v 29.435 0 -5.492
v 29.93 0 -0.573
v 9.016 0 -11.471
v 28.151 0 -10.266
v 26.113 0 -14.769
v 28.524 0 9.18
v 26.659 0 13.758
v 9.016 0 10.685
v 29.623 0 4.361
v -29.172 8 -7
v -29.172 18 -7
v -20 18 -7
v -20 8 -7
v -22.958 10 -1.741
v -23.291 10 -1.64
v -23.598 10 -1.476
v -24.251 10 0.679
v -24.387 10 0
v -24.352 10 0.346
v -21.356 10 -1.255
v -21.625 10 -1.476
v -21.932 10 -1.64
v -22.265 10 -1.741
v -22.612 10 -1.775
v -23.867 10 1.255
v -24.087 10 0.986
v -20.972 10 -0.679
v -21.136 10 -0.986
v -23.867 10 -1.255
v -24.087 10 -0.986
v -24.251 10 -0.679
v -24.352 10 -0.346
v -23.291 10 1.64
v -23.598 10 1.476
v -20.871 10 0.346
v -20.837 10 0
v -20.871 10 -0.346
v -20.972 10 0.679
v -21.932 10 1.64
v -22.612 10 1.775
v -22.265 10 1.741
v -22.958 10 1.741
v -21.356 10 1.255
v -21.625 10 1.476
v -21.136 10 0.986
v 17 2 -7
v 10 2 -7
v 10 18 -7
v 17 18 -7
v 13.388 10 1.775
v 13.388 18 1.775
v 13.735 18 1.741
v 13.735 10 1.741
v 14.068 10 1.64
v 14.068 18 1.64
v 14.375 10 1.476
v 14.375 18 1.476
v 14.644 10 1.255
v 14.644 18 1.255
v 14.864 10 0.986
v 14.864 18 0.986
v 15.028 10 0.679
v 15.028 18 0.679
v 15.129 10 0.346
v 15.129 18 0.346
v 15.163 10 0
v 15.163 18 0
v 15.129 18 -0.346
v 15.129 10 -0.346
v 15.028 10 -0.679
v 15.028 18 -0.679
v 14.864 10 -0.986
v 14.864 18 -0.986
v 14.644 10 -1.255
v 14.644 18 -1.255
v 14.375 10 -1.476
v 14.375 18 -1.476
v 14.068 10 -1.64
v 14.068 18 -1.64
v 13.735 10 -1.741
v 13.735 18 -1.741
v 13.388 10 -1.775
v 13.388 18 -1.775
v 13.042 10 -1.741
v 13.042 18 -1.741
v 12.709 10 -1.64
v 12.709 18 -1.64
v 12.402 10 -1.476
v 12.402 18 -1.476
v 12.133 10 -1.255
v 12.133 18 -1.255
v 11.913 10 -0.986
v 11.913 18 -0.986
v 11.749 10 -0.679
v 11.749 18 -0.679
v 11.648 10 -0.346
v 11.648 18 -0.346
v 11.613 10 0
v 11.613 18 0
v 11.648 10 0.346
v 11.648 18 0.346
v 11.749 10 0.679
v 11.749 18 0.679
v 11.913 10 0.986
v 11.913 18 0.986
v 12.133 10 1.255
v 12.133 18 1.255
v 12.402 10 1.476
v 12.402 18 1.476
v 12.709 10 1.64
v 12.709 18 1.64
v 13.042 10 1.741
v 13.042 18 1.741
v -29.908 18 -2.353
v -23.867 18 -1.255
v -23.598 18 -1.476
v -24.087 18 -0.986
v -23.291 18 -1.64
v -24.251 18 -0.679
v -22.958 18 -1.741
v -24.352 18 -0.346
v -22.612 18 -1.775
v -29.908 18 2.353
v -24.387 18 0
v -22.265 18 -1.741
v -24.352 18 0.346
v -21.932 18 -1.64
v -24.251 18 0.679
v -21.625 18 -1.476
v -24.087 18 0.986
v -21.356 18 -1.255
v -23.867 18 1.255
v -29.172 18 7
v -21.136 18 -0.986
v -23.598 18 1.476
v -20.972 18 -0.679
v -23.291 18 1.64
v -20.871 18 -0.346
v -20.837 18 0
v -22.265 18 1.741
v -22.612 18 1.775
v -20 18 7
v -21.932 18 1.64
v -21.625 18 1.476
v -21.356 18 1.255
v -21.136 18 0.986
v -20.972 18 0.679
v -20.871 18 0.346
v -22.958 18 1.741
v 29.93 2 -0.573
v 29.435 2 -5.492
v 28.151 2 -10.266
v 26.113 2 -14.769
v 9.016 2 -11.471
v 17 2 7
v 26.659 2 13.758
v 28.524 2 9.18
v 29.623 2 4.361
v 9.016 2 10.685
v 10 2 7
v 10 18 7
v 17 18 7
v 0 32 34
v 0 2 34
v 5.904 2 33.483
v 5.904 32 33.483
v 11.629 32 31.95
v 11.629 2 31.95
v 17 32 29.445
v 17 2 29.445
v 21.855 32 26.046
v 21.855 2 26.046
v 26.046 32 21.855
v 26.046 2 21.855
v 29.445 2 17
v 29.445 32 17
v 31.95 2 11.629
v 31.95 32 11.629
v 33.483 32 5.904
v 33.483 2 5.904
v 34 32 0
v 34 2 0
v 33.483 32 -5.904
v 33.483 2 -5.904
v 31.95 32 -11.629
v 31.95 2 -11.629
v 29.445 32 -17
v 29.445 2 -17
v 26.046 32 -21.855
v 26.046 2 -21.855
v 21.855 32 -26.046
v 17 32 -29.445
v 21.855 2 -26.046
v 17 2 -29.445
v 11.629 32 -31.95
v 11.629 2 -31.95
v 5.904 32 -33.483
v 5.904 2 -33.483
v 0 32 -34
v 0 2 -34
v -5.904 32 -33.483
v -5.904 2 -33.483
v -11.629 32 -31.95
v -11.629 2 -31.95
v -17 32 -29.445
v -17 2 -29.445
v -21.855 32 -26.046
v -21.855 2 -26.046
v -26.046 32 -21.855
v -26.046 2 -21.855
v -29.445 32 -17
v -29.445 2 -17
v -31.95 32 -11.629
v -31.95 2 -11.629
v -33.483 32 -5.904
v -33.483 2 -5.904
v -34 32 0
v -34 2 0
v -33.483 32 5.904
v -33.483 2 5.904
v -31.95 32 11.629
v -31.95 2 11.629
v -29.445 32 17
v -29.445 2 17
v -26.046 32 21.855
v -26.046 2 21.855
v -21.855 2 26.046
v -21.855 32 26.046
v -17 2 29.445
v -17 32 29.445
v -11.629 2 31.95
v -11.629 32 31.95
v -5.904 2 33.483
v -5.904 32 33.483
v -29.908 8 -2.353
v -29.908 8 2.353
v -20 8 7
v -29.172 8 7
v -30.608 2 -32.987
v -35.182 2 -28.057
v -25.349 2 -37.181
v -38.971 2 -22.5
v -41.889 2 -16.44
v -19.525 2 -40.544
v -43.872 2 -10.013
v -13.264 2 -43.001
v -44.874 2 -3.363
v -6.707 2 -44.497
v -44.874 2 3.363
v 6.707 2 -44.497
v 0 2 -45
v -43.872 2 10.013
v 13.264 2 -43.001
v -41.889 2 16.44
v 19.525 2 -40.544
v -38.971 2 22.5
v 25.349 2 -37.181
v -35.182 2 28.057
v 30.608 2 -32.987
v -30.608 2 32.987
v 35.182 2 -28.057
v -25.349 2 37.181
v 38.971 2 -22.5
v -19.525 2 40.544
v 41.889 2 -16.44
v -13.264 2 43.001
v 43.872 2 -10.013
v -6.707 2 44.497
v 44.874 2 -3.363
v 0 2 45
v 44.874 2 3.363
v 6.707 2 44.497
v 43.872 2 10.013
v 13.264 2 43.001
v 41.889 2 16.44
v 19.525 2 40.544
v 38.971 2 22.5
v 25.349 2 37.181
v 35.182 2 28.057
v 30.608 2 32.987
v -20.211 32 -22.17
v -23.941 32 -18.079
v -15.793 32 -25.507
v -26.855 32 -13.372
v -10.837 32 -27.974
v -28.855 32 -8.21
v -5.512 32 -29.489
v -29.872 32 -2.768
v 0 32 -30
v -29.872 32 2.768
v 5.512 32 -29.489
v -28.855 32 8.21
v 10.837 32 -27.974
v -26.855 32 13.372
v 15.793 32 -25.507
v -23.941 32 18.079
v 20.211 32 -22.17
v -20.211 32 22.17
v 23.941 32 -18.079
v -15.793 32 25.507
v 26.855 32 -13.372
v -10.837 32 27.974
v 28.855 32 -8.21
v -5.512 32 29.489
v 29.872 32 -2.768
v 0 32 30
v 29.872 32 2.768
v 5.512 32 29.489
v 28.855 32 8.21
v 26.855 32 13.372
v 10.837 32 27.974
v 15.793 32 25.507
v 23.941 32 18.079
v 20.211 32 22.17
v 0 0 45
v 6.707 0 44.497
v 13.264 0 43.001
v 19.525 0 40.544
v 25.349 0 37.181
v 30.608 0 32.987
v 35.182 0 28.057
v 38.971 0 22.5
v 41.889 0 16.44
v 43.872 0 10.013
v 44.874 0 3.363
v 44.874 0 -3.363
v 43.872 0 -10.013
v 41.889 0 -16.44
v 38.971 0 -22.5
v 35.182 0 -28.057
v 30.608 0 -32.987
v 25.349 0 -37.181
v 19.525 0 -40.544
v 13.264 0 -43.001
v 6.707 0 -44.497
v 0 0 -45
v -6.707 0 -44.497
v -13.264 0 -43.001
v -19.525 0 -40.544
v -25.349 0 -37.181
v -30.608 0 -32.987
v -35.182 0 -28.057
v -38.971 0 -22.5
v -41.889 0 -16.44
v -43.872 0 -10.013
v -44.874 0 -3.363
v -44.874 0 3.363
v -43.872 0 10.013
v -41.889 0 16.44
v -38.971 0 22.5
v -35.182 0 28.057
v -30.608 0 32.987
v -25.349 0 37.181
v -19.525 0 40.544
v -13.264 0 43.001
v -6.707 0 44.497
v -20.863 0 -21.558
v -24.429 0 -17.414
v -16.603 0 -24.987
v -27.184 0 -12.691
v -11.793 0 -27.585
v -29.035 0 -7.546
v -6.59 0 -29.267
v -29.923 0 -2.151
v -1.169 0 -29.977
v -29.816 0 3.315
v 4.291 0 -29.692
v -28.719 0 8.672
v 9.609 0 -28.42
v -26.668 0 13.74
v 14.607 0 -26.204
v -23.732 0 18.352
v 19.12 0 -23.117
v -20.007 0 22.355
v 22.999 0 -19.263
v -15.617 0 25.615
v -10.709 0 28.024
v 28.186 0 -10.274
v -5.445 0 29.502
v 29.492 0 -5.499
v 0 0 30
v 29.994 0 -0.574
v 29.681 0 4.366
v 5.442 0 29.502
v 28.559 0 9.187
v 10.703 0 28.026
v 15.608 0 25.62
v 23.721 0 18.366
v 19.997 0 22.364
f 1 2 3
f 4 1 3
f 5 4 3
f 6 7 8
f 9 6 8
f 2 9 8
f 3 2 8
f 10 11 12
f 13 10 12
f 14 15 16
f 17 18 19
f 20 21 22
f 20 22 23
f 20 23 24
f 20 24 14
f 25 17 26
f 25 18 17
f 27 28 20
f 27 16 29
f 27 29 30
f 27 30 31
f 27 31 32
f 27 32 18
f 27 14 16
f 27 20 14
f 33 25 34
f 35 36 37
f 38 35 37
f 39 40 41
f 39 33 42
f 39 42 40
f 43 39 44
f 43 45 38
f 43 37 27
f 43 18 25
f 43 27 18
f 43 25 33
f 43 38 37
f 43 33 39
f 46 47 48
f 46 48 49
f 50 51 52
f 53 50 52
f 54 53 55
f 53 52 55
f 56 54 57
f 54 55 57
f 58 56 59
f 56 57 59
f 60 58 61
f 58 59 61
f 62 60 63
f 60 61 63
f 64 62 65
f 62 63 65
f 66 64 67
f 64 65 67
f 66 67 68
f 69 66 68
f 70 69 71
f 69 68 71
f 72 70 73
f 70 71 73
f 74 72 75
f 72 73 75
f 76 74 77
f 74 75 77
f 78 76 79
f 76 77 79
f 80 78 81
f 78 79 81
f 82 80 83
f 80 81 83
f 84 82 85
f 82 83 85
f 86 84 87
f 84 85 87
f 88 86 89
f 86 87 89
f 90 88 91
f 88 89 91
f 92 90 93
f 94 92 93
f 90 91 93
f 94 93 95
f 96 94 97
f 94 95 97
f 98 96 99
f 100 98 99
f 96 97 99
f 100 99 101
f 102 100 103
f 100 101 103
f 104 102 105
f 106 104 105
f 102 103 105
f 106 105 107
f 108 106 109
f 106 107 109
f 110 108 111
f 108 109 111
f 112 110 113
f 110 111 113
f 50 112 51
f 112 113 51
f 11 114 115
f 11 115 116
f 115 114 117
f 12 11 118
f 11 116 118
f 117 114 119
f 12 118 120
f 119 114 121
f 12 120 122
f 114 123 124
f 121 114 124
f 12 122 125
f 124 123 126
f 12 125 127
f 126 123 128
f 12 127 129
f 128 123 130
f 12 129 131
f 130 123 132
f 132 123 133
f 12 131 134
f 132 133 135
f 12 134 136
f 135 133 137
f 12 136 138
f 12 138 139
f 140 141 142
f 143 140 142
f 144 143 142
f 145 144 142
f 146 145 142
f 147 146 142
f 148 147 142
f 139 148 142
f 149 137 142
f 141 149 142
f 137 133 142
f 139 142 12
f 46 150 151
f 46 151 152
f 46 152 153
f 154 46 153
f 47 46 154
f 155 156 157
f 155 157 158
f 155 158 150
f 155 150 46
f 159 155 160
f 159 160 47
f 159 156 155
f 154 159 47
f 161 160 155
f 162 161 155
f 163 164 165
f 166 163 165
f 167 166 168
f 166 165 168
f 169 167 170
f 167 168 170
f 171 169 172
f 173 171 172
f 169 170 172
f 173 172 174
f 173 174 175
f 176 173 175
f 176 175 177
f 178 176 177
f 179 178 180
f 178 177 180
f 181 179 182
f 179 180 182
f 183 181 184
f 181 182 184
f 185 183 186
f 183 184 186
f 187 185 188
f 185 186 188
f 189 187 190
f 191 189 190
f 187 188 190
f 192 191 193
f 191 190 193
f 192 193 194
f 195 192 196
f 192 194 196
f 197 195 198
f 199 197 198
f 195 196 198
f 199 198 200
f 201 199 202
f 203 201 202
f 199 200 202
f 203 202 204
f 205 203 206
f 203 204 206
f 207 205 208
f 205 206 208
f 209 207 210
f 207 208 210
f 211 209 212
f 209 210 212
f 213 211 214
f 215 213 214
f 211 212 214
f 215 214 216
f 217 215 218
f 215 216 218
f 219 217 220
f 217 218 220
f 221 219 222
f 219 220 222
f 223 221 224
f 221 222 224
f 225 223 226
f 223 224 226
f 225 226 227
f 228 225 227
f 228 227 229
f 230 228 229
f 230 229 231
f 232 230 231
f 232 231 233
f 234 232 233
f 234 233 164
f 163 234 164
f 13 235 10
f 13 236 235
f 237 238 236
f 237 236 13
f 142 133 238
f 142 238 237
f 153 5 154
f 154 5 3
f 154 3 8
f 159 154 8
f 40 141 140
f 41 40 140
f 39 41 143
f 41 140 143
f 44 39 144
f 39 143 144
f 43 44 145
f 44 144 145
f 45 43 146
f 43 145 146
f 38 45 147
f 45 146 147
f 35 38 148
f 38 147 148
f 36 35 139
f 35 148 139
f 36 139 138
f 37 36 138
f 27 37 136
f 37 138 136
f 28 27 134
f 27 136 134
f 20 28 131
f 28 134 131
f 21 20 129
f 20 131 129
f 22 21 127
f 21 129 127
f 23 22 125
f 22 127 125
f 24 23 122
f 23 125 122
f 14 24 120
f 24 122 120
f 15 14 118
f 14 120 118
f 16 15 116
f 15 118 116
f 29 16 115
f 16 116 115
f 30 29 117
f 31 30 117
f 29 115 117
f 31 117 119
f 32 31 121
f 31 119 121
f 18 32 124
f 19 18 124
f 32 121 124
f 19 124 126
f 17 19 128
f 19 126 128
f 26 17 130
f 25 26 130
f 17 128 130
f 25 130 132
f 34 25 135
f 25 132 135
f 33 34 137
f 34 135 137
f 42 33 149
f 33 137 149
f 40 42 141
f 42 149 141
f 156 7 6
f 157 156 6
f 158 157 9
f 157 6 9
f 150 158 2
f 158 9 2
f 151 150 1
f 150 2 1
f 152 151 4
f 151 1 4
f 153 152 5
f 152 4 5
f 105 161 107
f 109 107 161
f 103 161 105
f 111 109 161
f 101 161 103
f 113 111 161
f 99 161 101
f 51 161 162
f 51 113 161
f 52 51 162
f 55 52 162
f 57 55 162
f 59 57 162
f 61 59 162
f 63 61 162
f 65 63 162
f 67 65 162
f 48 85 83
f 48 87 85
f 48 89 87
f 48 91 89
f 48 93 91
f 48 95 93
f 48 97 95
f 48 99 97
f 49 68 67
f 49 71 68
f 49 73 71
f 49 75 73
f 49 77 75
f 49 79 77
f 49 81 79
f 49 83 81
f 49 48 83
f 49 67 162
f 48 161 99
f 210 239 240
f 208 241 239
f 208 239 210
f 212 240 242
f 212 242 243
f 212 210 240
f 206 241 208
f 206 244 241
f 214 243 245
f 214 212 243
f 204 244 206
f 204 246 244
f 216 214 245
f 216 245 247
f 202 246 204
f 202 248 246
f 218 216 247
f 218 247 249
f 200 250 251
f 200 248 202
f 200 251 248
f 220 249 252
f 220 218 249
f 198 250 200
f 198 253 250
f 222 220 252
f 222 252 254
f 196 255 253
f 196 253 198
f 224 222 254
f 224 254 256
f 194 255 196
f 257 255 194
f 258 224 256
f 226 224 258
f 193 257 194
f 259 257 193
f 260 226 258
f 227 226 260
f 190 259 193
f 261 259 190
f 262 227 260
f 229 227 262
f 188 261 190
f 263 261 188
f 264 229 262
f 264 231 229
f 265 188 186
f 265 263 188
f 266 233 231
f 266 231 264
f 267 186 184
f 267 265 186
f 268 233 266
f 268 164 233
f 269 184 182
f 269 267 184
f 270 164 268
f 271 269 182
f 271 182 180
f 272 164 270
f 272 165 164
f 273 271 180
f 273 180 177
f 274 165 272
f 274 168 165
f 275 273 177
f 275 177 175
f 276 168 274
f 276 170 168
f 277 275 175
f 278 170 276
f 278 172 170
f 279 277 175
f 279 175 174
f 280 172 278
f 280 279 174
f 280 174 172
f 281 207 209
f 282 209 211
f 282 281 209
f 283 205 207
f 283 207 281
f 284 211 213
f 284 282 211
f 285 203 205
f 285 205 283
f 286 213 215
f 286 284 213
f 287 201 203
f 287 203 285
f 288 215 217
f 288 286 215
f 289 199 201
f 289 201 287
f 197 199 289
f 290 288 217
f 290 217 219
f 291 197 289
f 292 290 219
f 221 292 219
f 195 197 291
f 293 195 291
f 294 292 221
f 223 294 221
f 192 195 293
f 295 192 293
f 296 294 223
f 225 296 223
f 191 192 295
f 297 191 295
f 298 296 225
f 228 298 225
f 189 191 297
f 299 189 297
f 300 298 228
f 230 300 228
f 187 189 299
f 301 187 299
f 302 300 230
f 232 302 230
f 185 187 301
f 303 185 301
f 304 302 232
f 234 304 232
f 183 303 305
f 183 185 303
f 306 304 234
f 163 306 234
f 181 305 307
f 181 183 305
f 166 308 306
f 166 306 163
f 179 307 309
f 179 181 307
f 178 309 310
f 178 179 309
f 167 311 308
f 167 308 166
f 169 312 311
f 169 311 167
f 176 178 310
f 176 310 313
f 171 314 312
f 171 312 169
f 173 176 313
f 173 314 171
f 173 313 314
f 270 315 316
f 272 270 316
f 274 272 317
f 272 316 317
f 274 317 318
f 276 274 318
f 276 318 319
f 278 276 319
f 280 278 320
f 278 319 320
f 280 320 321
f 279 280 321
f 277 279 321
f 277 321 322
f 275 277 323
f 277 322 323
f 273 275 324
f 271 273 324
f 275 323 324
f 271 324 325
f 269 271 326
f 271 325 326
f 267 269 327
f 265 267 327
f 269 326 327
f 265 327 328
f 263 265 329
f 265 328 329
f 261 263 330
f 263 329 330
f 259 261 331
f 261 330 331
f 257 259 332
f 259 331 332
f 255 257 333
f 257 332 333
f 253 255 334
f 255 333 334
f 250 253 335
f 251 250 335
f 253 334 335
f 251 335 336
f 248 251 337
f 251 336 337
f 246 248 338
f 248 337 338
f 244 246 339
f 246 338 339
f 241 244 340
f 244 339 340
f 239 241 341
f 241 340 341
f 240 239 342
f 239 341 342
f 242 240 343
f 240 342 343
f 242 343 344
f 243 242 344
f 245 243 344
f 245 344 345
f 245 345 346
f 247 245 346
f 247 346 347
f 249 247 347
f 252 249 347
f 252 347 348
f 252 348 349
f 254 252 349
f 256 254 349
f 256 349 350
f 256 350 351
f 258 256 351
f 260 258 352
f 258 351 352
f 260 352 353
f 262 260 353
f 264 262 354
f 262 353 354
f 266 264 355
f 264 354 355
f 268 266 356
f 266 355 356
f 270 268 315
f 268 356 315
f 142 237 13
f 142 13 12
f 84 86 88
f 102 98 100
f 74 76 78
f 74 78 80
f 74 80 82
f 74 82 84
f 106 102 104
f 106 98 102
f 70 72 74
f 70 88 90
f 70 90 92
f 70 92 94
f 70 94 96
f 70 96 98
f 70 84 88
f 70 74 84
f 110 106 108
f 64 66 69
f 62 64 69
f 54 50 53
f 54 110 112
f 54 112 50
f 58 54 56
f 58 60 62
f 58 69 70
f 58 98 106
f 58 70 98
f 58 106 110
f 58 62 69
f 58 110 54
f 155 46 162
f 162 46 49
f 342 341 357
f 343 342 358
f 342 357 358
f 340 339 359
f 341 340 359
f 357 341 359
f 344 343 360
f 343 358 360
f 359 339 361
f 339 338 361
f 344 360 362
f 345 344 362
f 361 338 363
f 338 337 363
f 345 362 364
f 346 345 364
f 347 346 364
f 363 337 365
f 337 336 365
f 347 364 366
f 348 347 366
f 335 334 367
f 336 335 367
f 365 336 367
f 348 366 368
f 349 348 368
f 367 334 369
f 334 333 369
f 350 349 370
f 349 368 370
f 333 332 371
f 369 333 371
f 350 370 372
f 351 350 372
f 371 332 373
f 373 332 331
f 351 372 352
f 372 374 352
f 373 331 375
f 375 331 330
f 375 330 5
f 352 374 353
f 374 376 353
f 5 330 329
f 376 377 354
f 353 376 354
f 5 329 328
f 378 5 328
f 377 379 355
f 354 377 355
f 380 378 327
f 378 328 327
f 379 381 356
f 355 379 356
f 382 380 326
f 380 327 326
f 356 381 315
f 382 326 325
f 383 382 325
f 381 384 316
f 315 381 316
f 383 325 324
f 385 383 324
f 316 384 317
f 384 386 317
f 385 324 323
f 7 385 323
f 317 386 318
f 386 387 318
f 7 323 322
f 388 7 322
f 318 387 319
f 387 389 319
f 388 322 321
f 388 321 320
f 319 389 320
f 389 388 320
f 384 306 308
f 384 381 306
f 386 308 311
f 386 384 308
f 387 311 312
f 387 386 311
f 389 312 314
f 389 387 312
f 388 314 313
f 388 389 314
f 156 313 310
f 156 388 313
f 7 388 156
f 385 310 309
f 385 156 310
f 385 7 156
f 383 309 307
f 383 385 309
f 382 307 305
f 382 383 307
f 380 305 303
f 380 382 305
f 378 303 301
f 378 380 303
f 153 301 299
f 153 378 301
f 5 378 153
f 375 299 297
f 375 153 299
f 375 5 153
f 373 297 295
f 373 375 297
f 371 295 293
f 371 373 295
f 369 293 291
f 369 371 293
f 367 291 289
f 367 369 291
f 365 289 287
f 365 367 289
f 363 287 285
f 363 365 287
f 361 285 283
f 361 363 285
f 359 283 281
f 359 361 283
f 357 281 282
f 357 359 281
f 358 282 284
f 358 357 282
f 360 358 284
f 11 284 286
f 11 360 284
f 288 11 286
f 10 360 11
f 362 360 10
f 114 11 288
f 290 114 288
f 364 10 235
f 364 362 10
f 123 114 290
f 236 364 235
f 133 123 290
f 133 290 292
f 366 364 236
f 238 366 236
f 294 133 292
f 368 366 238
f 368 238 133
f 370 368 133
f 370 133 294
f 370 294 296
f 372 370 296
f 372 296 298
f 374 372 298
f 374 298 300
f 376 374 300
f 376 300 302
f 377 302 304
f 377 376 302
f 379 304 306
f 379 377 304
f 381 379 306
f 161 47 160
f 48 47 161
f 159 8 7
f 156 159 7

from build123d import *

# Parameters (mm, degrees)
SKETCH1_R           = 45
SKETCH1_R_2         = 30
BOSS_EXTRUDE1_DEPTH = 2
SKETCH2_R           = 34
SKETCH2_R_2         = 30
BOSS_EXTRUDE2_DEPTH = 30
SKETCH4_W           = 7
SKETCH4_H           = 18
SKETCH4_W_2         = 10
SKETCH4_H_2         = 10
BOSS_EXTRUDE4_DEPTH = 7
BOSS_EXTRUDE5_DEPTH = 2
SKETCH7_R           = 1.775
CUT_EXTRUDE1_DEPTH  = 8


with BuildPart() as part:
    # Sketch1 → Boss-Extrude1 (new body)
    with BuildSketch(Plane(origin=(0, 0, 0), x_dir=(1, 0, 0), z_dir=(0, 1, 0))):
        with Locations(Location((0, 0, 0), (0, 0, 270))):
            Circle(SKETCH1_R)
        with Locations(Location((0, 0, 0), (0, 0, 270))):
            Circle(SKETCH1_R_2, mode=Mode.SUBTRACT)
    extrude(amount=BOSS_EXTRUDE1_DEPTH)

    # Sketch2 → Boss-Extrude2 (add)
    with BuildSketch(Plane(origin=(0, 2, 0), x_dir=(1, 0, 0), z_dir=(0, 1, 0))):
        with Locations(Location((0, 0, 0), (0, 0, 270))):
            Circle(SKETCH2_R)
        with Locations(Location((0, 0, 0), (0, 0, 270))):
            Circle(SKETCH2_R_2, mode=Mode.SUBTRACT)
    extrude(amount=BOSS_EXTRUDE2_DEPTH)

    # Sketch4 → Boss-Extrude4 (add, symmetric)
    with BuildSketch(Plane.XY):
        with Locations((13.5, 9)):
            Rectangle(SKETCH4_W, SKETCH4_H)
        with Locations((-25, 13)):
            Rectangle(SKETCH4_W_2, SKETCH4_H_2)
    extrude(amount=BOSS_EXTRUDE4_DEPTH, both=True)


with BuildPart() as boss_extrude4_piece_1:
    # of the separate pieces the step leaves, piece 1, a body of its own (boss_extrude4_pieces)
    add(part.part.solids().sort_by_distance((0, 0, 45))[0])



with BuildPart() as boss_extrude4_piece_2:
    # of the separate pieces the step leaves, piece 2, a body of its own (boss_extrude4_pieces)
    add(part.part.solids().sort_by_distance((17, 18, -7))[0])


with BuildPart() as boss_extrude4_piece_1_1:
    add(boss_extrude4_piece_1.part)

    add(boss_extrude4_piece_2.part)  # Boss-Extrude5 merges Boss-Extrude4 piece 2
    # Sketch5 → Boss-Extrude5 (add)
    with BuildSketch(Plane(origin=(0, 0, 0.832419338), x_dir=(1, 0, 0), z_dir=(0, -1, 0))):
        with BuildLine():
            Line((9.016041177, 9.852910493), (26.659104244, 12.925929433))
            ThreePointArc((26.659104244, 12.925929433), (29.929900496, -1.405666291), (26.112718683, -15.601506072))
            Line((26.112718683, -15.601506072), (9.016041177, -12.303735496))
            Line((9.016041177, -12.303735496), (9.016041177, 9.852910493))
        make_face()
    extrude(amount=-BOSS_EXTRUDE5_DEPTH)

    # Sketch7 → Cut-Extrude1 (cut)
    with BuildSketch(Plane(origin=(0, 18, 0), x_dir=(1, 0, 0), z_dir=(0, 1, 0))):
        with Locations(Location((-22.611566211, 0, 0), (0, 0, 270))):
            Circle(SKETCH7_R)
        with Locations(Location((13.388433789, 0, 0), (0, 0, 270))):
            Circle(SKETCH7_R)
    extrude(amount=-CUT_EXTRUDE1_DEPTH, mode=Mode.SUBTRACT)


solid = boss_extrude4_piece_1_1.part
